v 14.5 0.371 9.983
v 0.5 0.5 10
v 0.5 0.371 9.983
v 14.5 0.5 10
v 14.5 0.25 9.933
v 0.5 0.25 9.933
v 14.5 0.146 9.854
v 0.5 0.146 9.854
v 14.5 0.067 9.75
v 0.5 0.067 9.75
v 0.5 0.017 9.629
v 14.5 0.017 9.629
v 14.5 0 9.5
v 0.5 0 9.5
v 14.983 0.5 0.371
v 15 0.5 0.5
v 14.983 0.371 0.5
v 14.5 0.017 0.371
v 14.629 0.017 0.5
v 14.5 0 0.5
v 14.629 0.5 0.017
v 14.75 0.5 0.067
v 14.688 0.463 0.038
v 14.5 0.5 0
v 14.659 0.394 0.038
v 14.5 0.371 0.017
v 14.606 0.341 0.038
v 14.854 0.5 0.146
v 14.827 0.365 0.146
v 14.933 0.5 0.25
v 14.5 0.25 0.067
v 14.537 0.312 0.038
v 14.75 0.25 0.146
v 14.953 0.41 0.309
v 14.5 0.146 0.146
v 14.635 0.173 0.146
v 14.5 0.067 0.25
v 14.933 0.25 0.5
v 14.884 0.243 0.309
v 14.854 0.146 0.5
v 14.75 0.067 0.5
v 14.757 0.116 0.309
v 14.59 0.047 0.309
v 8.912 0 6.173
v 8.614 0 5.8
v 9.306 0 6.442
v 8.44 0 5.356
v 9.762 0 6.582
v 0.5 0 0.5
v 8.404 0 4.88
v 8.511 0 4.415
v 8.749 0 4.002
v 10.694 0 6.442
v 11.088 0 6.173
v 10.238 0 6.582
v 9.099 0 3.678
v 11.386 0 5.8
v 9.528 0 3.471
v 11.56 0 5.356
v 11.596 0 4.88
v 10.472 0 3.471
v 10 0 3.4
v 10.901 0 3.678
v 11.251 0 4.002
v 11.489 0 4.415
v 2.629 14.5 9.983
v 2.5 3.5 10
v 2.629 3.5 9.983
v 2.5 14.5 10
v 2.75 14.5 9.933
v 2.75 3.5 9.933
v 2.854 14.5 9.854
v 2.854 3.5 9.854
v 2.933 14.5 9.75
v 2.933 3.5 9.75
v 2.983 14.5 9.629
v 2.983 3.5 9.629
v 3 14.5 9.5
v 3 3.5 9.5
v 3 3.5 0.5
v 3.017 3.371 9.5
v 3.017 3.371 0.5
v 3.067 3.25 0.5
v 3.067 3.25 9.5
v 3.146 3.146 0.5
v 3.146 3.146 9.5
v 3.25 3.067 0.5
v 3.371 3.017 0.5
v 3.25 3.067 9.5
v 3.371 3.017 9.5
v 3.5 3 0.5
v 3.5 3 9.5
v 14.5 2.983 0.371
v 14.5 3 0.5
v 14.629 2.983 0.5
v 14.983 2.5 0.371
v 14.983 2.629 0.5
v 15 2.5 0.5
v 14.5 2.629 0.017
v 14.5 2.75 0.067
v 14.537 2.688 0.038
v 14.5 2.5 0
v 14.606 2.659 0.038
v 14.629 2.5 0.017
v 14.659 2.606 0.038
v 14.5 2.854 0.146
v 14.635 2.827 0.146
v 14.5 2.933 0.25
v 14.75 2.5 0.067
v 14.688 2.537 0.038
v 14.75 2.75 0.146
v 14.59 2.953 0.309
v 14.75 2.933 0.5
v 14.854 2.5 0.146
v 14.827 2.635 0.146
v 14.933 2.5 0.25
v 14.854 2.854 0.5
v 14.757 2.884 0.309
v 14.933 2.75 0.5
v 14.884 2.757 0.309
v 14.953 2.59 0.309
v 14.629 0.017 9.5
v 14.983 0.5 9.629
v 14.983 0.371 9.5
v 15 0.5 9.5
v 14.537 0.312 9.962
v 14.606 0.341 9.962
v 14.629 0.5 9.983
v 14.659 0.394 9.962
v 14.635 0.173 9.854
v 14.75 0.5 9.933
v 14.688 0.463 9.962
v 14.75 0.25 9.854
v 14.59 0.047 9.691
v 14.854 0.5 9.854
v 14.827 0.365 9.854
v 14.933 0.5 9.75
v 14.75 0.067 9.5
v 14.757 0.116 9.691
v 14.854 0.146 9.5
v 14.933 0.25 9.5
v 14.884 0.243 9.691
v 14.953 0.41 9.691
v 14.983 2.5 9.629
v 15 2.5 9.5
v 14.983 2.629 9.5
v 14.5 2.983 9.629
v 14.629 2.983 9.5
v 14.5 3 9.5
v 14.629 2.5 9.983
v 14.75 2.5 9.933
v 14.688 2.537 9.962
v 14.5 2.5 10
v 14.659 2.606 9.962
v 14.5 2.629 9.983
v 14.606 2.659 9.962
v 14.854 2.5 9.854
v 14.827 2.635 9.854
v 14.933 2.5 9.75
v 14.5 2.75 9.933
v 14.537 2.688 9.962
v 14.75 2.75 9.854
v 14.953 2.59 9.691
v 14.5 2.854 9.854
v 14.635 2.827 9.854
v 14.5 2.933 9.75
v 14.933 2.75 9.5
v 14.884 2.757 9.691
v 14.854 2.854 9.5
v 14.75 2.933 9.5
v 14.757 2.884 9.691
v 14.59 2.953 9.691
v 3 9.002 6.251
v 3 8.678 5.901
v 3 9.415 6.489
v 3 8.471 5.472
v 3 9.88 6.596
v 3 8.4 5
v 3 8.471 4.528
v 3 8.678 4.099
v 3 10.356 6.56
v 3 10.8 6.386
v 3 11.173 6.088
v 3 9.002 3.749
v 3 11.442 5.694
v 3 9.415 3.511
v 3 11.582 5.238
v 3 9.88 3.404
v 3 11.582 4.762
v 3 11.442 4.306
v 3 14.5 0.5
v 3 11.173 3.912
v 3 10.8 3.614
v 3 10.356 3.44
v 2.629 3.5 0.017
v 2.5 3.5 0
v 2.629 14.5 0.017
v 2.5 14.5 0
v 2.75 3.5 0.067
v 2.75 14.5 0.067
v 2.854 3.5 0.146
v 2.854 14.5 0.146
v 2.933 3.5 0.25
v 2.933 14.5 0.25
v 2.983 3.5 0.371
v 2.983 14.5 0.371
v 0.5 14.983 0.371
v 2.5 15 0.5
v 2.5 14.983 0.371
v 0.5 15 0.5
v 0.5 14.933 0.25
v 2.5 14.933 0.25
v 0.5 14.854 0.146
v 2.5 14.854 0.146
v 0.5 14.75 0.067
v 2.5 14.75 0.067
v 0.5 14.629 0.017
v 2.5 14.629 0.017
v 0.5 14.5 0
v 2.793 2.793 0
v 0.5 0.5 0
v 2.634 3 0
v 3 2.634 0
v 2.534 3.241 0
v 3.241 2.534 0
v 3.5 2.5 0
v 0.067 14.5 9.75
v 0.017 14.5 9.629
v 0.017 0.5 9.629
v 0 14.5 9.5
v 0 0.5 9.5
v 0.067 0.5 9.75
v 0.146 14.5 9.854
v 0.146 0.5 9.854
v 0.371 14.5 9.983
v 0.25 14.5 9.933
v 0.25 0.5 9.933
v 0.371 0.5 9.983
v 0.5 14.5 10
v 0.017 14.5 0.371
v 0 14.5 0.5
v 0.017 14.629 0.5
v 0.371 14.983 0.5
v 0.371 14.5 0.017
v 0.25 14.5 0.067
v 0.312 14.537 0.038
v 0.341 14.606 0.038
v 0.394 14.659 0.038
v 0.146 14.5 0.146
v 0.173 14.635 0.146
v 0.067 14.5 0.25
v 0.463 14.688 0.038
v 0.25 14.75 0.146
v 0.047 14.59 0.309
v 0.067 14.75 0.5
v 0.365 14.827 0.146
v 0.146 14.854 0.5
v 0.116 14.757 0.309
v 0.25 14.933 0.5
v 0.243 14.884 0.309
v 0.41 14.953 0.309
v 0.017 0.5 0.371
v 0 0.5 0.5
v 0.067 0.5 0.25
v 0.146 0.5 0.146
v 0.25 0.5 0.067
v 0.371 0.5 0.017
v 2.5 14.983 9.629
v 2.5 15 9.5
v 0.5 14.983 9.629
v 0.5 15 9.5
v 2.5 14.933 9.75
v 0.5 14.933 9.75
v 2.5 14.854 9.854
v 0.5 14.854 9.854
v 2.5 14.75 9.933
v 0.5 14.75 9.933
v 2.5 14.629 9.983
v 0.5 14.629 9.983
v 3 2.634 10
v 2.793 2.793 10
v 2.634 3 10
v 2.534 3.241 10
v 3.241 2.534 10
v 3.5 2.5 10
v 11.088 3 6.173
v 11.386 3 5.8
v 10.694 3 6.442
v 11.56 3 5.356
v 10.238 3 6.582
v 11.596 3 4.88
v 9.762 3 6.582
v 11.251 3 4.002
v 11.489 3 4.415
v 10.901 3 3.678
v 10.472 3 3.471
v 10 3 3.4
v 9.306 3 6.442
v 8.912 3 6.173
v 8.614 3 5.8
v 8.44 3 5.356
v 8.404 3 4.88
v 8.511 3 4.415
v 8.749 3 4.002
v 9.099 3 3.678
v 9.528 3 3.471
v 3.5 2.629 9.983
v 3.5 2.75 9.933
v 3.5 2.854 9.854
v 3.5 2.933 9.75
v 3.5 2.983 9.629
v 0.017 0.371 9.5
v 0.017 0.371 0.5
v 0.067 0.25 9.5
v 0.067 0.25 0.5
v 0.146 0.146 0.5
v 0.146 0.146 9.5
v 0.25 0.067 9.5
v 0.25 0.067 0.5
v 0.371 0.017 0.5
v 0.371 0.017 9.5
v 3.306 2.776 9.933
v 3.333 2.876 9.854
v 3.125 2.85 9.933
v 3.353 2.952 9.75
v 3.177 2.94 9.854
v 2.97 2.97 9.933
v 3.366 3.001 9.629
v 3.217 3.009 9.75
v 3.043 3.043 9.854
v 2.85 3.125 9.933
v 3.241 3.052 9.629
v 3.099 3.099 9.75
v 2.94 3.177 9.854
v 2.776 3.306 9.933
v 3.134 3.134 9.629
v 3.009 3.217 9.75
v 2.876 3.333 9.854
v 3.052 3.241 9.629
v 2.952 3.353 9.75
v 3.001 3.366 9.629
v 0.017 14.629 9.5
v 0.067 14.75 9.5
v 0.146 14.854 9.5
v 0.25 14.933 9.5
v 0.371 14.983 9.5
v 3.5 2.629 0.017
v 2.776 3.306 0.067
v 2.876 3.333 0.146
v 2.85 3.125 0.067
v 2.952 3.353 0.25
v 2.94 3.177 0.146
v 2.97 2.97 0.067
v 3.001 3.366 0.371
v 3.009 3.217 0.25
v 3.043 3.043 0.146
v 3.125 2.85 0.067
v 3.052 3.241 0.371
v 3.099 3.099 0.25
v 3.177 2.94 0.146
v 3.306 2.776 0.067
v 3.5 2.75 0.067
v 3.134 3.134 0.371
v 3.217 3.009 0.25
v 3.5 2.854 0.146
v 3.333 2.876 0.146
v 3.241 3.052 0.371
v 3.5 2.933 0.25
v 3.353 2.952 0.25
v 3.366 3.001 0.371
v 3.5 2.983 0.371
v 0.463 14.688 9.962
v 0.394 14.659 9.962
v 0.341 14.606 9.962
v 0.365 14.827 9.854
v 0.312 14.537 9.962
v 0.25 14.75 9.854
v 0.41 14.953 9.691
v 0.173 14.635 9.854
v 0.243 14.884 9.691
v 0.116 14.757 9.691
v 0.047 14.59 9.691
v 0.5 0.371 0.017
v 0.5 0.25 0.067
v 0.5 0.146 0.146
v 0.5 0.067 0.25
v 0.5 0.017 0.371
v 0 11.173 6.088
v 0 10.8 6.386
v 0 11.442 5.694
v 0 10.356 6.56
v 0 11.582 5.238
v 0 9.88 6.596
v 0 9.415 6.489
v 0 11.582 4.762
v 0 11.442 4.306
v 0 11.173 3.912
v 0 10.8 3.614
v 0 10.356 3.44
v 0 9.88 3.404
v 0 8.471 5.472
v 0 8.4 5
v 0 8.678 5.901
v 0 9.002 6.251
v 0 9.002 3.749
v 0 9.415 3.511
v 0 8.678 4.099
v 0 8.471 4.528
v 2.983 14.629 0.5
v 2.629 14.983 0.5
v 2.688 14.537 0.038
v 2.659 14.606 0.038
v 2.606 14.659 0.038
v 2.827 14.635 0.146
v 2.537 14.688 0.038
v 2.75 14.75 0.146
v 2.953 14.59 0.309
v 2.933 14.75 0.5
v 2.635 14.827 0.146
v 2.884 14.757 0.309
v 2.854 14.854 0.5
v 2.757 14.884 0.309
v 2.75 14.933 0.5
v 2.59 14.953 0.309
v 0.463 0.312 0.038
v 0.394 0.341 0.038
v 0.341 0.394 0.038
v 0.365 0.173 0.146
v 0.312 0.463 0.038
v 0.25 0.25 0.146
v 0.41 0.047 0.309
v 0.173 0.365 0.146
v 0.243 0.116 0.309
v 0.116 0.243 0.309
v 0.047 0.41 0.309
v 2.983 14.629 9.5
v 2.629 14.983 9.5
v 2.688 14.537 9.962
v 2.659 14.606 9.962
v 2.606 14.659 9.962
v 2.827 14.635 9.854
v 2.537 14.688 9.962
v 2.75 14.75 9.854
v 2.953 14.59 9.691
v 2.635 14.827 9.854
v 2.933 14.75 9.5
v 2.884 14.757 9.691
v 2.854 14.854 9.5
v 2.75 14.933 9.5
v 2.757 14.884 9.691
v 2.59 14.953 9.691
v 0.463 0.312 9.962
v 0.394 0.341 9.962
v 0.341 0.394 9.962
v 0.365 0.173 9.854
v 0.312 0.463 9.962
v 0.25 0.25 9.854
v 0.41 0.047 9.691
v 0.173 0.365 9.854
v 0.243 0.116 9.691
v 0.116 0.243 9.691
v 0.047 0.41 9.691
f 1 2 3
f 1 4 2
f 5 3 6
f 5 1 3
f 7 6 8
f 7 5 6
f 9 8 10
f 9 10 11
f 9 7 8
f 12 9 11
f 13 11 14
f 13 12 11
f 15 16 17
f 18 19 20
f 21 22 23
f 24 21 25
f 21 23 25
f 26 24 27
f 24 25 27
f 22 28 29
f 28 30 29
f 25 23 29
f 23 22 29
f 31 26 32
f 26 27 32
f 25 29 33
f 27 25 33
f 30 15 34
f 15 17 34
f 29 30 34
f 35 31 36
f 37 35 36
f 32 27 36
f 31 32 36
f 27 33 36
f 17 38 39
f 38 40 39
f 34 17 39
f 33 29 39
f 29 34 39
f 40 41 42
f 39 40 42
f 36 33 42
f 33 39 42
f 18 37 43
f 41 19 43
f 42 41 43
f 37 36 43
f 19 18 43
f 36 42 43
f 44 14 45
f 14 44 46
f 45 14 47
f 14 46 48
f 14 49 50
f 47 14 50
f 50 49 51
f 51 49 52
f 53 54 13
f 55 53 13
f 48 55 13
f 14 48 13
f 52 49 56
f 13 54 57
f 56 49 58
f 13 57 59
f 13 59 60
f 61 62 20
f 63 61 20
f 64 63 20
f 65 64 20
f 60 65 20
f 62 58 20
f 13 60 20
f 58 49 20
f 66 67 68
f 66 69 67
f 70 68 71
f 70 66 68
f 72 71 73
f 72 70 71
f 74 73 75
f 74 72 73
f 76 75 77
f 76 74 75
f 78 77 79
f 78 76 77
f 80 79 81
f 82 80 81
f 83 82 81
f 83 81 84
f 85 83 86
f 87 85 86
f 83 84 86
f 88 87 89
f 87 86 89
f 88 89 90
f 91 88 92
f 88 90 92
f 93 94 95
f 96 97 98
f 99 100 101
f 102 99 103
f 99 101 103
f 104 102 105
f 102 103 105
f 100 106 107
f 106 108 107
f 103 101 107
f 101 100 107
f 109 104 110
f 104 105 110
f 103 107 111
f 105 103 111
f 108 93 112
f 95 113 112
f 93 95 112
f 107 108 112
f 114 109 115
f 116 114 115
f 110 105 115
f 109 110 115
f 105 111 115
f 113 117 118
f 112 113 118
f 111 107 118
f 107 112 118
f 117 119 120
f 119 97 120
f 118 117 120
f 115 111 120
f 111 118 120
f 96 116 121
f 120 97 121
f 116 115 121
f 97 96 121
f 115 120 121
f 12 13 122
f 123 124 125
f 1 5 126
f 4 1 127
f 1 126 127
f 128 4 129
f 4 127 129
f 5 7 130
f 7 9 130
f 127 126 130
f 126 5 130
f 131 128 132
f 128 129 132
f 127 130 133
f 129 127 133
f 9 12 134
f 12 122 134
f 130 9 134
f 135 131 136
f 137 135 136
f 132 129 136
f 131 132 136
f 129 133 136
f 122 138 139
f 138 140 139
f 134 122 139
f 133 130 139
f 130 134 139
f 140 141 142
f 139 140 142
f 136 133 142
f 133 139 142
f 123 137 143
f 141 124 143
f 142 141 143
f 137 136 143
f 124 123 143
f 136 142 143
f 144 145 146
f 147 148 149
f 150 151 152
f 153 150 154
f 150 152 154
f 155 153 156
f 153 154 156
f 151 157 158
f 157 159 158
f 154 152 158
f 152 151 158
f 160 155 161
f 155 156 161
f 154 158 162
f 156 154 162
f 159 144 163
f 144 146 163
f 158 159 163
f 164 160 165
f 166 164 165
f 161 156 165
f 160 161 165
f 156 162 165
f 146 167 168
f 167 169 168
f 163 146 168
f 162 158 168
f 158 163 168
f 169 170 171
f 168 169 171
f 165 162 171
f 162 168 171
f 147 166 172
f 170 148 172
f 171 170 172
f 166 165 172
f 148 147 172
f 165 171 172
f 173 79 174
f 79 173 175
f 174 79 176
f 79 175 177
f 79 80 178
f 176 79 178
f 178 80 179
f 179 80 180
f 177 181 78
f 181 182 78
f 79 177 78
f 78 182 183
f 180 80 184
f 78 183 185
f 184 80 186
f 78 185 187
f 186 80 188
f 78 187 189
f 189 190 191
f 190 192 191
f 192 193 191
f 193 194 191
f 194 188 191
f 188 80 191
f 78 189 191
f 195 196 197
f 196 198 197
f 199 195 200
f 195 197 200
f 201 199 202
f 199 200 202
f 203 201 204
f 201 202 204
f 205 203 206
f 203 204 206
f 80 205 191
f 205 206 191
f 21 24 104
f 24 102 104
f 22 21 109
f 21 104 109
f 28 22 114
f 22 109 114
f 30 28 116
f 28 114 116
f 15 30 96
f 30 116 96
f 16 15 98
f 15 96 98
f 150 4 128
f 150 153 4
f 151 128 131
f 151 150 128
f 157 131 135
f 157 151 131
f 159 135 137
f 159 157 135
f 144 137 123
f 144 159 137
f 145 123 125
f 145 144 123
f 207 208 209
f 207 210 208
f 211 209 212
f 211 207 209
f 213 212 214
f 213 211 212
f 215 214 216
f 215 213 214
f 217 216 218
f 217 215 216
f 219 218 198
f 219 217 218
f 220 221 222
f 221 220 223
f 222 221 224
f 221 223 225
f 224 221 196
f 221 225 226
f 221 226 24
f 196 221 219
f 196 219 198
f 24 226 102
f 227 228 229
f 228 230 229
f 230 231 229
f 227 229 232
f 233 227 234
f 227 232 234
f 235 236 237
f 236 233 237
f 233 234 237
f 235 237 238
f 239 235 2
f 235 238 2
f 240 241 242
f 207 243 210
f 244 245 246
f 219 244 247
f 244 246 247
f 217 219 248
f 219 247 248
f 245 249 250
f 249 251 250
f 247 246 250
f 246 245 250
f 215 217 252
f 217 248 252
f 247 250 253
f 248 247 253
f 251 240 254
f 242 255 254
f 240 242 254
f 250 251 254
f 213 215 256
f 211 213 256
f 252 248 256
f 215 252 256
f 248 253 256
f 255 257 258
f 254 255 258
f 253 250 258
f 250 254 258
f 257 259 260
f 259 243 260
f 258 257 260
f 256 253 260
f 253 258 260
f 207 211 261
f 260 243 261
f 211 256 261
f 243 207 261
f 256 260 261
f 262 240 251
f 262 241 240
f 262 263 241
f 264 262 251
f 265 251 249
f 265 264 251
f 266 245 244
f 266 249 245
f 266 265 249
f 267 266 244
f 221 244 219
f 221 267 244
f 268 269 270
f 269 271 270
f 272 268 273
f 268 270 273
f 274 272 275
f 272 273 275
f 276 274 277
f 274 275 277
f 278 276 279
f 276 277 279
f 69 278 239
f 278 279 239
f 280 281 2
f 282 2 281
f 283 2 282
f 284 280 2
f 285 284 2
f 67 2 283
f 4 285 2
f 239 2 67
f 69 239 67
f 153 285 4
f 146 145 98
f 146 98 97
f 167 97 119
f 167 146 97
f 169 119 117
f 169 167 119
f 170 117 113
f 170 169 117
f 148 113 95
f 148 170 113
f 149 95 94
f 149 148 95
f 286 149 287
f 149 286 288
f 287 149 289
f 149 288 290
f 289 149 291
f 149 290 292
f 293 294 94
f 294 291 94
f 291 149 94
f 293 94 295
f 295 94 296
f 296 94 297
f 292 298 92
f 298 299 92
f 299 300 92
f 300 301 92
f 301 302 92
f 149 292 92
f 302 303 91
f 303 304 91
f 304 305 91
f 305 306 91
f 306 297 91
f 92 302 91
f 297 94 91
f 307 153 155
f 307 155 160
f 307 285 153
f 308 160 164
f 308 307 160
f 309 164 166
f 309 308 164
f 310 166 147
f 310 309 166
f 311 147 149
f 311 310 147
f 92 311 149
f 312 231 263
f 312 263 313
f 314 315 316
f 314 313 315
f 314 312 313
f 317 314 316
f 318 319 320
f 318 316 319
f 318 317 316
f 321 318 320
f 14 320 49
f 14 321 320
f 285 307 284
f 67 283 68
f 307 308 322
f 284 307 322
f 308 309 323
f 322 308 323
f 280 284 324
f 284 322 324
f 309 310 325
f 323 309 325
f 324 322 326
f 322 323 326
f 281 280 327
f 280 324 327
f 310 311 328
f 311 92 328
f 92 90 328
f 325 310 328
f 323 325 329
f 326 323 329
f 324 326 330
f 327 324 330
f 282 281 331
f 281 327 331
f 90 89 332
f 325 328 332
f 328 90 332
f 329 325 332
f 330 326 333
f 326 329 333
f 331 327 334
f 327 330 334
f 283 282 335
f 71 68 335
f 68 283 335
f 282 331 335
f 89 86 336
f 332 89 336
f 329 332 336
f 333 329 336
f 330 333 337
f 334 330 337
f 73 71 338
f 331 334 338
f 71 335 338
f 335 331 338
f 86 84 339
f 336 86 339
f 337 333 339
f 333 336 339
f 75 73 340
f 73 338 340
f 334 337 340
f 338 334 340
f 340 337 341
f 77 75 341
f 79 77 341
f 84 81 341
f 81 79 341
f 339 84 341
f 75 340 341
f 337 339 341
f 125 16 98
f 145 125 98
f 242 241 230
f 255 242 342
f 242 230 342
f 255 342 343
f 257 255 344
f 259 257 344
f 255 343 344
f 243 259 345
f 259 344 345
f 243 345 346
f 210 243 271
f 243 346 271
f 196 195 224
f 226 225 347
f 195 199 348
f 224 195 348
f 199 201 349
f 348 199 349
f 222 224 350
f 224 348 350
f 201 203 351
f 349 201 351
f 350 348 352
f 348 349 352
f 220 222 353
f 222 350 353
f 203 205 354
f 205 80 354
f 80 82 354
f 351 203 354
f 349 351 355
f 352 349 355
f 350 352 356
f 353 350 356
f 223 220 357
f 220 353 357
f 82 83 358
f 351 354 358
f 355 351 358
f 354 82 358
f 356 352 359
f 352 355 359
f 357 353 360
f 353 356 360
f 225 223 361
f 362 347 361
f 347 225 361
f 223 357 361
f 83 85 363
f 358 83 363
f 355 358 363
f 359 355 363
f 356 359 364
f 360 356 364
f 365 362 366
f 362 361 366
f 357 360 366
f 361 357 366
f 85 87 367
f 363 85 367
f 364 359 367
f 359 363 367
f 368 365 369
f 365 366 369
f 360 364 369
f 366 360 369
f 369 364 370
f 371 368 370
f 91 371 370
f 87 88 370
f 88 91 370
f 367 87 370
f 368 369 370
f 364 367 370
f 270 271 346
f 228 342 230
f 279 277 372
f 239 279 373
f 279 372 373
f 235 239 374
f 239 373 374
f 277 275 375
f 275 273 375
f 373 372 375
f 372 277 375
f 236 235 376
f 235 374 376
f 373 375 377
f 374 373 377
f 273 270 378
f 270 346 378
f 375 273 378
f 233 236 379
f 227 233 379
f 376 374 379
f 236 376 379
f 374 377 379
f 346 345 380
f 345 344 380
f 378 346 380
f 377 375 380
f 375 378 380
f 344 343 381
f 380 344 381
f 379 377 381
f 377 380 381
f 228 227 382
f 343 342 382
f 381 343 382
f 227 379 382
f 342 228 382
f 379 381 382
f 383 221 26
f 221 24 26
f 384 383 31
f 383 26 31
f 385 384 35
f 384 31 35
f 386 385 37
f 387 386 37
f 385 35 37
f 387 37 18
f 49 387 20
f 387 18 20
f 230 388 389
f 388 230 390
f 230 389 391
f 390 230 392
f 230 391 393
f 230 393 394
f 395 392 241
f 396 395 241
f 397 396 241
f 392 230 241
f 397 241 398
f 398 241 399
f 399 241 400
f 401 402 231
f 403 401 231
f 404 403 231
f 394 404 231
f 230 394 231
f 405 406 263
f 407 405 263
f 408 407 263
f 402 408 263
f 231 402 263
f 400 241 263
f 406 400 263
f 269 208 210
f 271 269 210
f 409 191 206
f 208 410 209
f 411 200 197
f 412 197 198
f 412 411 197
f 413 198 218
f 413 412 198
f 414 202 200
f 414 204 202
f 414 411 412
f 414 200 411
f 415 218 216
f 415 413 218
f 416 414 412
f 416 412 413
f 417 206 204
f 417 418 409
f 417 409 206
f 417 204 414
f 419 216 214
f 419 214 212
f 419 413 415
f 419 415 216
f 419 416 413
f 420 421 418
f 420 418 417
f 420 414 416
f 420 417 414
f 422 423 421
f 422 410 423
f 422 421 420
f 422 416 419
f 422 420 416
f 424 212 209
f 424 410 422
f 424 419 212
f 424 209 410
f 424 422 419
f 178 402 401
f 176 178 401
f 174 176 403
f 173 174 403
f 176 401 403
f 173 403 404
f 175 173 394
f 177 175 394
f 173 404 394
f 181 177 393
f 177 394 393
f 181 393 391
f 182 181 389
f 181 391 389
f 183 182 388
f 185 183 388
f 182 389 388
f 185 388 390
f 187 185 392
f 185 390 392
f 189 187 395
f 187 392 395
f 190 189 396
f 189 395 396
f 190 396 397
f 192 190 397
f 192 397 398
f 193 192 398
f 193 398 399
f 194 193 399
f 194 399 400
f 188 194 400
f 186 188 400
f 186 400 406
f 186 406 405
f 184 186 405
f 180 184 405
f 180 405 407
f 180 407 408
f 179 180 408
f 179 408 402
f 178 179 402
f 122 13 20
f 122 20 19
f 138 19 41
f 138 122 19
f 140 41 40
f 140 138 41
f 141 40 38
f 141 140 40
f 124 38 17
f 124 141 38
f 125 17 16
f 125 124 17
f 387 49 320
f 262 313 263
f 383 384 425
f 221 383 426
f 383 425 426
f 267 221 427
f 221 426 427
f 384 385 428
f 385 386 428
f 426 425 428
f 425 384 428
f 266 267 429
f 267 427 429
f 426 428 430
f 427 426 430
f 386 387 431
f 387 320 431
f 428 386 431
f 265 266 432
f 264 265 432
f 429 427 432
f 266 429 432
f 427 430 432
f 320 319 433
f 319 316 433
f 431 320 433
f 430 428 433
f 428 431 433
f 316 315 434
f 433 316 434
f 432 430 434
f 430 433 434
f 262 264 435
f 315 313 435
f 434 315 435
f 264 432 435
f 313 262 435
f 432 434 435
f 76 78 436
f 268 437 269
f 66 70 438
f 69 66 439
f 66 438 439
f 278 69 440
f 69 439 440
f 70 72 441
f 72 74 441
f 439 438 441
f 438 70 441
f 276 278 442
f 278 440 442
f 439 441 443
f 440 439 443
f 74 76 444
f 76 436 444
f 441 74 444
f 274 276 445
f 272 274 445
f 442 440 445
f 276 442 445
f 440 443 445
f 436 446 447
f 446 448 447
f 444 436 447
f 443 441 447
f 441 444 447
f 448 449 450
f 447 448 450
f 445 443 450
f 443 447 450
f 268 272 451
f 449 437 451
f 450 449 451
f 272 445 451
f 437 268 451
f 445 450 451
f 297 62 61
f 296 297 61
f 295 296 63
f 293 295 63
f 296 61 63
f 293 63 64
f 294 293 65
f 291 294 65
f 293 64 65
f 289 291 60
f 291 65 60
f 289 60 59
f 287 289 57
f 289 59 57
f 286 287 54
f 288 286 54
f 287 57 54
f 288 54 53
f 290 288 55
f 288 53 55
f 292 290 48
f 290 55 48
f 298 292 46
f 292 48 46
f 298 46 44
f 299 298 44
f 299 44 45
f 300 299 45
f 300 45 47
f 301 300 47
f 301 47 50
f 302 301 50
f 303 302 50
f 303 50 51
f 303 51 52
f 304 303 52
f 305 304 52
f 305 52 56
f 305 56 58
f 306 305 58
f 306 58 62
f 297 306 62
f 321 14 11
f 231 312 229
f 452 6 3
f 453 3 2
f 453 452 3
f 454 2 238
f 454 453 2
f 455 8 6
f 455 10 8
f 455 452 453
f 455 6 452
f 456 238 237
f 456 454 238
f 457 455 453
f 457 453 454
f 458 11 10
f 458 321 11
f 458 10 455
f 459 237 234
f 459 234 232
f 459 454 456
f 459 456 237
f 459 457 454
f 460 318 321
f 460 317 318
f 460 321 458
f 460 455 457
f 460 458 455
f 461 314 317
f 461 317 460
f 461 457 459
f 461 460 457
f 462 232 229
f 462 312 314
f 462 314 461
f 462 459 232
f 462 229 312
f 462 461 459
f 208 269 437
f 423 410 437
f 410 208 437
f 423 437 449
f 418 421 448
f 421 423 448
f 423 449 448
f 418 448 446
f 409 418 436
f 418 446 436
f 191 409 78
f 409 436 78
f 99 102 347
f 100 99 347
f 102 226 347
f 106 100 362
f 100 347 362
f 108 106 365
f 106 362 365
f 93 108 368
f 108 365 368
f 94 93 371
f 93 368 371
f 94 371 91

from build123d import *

# Parameters (mm, degrees)
EXTRUDE_1_DEPTH     = 10
SKETCH_3_R          = 1.6
CUT_EXTRUDE_1_DEPTH = 5
SKETCH_2_R          = 1.6
CUT_EXTRUDE_2_DEPTH = 5
FILLET_1_R          = 0.5


with BuildPart() as part:
    # Sketch 1 → 凸台-拉伸1 (new body)
    with BuildSketch(Plane.XY):
        Polygon((0, 15), (0, 0), (15, 0), (15, 3), (3, 3), (3, 15), align=None)
    extrude(amount=EXTRUDE_1_DEPTH)

    # 草图3 → 切除-拉伸1 (cut)
    with BuildSketch(Plane.XZ):
        with Locations(Location((10, 5, 0), (0, 0, 270))):
            Circle(SKETCH_3_R)
    extrude(amount=-CUT_EXTRUDE_1_DEPTH, mode=Mode.SUBTRACT)

    # Sketch 2 → 切除-拉伸2 (cut)
    with BuildSketch(Plane.ZY):
        with Locations(Location((5, 10, 0), (0, 0, 270))):
            Circle(SKETCH_2_R)
    extrude(amount=-CUT_EXTRUDE_2_DEPTH, mode=Mode.SUBTRACT)

    # 圆角1
    fillet_1_edges = [part.edges().sort_by_distance(p)[0] for p in [
        (3, 15, 5),
        (3, 3, 5),
        (15, 3, 5),
        (15, 0, 5),
        (0, 0, 5),
        (0, 15, 5),
        (7.5, 0, 10),
        (15, 1.5, 10),
        (9, 3, 10),
        (3, 9, 10),
        (1.5, 15, 10),
        (3, 9, 0),
        (9, 3, 0),
        (15, 1.5, 0),
        (7.5, 0, 0),
        (0, 7.5, 0),
        (1.5, 15, 0),
        (0, 7.5, 10),
    ]]
    fillet(fillet_1_edges, radius=FILLET_1_R)


solid = part.part
